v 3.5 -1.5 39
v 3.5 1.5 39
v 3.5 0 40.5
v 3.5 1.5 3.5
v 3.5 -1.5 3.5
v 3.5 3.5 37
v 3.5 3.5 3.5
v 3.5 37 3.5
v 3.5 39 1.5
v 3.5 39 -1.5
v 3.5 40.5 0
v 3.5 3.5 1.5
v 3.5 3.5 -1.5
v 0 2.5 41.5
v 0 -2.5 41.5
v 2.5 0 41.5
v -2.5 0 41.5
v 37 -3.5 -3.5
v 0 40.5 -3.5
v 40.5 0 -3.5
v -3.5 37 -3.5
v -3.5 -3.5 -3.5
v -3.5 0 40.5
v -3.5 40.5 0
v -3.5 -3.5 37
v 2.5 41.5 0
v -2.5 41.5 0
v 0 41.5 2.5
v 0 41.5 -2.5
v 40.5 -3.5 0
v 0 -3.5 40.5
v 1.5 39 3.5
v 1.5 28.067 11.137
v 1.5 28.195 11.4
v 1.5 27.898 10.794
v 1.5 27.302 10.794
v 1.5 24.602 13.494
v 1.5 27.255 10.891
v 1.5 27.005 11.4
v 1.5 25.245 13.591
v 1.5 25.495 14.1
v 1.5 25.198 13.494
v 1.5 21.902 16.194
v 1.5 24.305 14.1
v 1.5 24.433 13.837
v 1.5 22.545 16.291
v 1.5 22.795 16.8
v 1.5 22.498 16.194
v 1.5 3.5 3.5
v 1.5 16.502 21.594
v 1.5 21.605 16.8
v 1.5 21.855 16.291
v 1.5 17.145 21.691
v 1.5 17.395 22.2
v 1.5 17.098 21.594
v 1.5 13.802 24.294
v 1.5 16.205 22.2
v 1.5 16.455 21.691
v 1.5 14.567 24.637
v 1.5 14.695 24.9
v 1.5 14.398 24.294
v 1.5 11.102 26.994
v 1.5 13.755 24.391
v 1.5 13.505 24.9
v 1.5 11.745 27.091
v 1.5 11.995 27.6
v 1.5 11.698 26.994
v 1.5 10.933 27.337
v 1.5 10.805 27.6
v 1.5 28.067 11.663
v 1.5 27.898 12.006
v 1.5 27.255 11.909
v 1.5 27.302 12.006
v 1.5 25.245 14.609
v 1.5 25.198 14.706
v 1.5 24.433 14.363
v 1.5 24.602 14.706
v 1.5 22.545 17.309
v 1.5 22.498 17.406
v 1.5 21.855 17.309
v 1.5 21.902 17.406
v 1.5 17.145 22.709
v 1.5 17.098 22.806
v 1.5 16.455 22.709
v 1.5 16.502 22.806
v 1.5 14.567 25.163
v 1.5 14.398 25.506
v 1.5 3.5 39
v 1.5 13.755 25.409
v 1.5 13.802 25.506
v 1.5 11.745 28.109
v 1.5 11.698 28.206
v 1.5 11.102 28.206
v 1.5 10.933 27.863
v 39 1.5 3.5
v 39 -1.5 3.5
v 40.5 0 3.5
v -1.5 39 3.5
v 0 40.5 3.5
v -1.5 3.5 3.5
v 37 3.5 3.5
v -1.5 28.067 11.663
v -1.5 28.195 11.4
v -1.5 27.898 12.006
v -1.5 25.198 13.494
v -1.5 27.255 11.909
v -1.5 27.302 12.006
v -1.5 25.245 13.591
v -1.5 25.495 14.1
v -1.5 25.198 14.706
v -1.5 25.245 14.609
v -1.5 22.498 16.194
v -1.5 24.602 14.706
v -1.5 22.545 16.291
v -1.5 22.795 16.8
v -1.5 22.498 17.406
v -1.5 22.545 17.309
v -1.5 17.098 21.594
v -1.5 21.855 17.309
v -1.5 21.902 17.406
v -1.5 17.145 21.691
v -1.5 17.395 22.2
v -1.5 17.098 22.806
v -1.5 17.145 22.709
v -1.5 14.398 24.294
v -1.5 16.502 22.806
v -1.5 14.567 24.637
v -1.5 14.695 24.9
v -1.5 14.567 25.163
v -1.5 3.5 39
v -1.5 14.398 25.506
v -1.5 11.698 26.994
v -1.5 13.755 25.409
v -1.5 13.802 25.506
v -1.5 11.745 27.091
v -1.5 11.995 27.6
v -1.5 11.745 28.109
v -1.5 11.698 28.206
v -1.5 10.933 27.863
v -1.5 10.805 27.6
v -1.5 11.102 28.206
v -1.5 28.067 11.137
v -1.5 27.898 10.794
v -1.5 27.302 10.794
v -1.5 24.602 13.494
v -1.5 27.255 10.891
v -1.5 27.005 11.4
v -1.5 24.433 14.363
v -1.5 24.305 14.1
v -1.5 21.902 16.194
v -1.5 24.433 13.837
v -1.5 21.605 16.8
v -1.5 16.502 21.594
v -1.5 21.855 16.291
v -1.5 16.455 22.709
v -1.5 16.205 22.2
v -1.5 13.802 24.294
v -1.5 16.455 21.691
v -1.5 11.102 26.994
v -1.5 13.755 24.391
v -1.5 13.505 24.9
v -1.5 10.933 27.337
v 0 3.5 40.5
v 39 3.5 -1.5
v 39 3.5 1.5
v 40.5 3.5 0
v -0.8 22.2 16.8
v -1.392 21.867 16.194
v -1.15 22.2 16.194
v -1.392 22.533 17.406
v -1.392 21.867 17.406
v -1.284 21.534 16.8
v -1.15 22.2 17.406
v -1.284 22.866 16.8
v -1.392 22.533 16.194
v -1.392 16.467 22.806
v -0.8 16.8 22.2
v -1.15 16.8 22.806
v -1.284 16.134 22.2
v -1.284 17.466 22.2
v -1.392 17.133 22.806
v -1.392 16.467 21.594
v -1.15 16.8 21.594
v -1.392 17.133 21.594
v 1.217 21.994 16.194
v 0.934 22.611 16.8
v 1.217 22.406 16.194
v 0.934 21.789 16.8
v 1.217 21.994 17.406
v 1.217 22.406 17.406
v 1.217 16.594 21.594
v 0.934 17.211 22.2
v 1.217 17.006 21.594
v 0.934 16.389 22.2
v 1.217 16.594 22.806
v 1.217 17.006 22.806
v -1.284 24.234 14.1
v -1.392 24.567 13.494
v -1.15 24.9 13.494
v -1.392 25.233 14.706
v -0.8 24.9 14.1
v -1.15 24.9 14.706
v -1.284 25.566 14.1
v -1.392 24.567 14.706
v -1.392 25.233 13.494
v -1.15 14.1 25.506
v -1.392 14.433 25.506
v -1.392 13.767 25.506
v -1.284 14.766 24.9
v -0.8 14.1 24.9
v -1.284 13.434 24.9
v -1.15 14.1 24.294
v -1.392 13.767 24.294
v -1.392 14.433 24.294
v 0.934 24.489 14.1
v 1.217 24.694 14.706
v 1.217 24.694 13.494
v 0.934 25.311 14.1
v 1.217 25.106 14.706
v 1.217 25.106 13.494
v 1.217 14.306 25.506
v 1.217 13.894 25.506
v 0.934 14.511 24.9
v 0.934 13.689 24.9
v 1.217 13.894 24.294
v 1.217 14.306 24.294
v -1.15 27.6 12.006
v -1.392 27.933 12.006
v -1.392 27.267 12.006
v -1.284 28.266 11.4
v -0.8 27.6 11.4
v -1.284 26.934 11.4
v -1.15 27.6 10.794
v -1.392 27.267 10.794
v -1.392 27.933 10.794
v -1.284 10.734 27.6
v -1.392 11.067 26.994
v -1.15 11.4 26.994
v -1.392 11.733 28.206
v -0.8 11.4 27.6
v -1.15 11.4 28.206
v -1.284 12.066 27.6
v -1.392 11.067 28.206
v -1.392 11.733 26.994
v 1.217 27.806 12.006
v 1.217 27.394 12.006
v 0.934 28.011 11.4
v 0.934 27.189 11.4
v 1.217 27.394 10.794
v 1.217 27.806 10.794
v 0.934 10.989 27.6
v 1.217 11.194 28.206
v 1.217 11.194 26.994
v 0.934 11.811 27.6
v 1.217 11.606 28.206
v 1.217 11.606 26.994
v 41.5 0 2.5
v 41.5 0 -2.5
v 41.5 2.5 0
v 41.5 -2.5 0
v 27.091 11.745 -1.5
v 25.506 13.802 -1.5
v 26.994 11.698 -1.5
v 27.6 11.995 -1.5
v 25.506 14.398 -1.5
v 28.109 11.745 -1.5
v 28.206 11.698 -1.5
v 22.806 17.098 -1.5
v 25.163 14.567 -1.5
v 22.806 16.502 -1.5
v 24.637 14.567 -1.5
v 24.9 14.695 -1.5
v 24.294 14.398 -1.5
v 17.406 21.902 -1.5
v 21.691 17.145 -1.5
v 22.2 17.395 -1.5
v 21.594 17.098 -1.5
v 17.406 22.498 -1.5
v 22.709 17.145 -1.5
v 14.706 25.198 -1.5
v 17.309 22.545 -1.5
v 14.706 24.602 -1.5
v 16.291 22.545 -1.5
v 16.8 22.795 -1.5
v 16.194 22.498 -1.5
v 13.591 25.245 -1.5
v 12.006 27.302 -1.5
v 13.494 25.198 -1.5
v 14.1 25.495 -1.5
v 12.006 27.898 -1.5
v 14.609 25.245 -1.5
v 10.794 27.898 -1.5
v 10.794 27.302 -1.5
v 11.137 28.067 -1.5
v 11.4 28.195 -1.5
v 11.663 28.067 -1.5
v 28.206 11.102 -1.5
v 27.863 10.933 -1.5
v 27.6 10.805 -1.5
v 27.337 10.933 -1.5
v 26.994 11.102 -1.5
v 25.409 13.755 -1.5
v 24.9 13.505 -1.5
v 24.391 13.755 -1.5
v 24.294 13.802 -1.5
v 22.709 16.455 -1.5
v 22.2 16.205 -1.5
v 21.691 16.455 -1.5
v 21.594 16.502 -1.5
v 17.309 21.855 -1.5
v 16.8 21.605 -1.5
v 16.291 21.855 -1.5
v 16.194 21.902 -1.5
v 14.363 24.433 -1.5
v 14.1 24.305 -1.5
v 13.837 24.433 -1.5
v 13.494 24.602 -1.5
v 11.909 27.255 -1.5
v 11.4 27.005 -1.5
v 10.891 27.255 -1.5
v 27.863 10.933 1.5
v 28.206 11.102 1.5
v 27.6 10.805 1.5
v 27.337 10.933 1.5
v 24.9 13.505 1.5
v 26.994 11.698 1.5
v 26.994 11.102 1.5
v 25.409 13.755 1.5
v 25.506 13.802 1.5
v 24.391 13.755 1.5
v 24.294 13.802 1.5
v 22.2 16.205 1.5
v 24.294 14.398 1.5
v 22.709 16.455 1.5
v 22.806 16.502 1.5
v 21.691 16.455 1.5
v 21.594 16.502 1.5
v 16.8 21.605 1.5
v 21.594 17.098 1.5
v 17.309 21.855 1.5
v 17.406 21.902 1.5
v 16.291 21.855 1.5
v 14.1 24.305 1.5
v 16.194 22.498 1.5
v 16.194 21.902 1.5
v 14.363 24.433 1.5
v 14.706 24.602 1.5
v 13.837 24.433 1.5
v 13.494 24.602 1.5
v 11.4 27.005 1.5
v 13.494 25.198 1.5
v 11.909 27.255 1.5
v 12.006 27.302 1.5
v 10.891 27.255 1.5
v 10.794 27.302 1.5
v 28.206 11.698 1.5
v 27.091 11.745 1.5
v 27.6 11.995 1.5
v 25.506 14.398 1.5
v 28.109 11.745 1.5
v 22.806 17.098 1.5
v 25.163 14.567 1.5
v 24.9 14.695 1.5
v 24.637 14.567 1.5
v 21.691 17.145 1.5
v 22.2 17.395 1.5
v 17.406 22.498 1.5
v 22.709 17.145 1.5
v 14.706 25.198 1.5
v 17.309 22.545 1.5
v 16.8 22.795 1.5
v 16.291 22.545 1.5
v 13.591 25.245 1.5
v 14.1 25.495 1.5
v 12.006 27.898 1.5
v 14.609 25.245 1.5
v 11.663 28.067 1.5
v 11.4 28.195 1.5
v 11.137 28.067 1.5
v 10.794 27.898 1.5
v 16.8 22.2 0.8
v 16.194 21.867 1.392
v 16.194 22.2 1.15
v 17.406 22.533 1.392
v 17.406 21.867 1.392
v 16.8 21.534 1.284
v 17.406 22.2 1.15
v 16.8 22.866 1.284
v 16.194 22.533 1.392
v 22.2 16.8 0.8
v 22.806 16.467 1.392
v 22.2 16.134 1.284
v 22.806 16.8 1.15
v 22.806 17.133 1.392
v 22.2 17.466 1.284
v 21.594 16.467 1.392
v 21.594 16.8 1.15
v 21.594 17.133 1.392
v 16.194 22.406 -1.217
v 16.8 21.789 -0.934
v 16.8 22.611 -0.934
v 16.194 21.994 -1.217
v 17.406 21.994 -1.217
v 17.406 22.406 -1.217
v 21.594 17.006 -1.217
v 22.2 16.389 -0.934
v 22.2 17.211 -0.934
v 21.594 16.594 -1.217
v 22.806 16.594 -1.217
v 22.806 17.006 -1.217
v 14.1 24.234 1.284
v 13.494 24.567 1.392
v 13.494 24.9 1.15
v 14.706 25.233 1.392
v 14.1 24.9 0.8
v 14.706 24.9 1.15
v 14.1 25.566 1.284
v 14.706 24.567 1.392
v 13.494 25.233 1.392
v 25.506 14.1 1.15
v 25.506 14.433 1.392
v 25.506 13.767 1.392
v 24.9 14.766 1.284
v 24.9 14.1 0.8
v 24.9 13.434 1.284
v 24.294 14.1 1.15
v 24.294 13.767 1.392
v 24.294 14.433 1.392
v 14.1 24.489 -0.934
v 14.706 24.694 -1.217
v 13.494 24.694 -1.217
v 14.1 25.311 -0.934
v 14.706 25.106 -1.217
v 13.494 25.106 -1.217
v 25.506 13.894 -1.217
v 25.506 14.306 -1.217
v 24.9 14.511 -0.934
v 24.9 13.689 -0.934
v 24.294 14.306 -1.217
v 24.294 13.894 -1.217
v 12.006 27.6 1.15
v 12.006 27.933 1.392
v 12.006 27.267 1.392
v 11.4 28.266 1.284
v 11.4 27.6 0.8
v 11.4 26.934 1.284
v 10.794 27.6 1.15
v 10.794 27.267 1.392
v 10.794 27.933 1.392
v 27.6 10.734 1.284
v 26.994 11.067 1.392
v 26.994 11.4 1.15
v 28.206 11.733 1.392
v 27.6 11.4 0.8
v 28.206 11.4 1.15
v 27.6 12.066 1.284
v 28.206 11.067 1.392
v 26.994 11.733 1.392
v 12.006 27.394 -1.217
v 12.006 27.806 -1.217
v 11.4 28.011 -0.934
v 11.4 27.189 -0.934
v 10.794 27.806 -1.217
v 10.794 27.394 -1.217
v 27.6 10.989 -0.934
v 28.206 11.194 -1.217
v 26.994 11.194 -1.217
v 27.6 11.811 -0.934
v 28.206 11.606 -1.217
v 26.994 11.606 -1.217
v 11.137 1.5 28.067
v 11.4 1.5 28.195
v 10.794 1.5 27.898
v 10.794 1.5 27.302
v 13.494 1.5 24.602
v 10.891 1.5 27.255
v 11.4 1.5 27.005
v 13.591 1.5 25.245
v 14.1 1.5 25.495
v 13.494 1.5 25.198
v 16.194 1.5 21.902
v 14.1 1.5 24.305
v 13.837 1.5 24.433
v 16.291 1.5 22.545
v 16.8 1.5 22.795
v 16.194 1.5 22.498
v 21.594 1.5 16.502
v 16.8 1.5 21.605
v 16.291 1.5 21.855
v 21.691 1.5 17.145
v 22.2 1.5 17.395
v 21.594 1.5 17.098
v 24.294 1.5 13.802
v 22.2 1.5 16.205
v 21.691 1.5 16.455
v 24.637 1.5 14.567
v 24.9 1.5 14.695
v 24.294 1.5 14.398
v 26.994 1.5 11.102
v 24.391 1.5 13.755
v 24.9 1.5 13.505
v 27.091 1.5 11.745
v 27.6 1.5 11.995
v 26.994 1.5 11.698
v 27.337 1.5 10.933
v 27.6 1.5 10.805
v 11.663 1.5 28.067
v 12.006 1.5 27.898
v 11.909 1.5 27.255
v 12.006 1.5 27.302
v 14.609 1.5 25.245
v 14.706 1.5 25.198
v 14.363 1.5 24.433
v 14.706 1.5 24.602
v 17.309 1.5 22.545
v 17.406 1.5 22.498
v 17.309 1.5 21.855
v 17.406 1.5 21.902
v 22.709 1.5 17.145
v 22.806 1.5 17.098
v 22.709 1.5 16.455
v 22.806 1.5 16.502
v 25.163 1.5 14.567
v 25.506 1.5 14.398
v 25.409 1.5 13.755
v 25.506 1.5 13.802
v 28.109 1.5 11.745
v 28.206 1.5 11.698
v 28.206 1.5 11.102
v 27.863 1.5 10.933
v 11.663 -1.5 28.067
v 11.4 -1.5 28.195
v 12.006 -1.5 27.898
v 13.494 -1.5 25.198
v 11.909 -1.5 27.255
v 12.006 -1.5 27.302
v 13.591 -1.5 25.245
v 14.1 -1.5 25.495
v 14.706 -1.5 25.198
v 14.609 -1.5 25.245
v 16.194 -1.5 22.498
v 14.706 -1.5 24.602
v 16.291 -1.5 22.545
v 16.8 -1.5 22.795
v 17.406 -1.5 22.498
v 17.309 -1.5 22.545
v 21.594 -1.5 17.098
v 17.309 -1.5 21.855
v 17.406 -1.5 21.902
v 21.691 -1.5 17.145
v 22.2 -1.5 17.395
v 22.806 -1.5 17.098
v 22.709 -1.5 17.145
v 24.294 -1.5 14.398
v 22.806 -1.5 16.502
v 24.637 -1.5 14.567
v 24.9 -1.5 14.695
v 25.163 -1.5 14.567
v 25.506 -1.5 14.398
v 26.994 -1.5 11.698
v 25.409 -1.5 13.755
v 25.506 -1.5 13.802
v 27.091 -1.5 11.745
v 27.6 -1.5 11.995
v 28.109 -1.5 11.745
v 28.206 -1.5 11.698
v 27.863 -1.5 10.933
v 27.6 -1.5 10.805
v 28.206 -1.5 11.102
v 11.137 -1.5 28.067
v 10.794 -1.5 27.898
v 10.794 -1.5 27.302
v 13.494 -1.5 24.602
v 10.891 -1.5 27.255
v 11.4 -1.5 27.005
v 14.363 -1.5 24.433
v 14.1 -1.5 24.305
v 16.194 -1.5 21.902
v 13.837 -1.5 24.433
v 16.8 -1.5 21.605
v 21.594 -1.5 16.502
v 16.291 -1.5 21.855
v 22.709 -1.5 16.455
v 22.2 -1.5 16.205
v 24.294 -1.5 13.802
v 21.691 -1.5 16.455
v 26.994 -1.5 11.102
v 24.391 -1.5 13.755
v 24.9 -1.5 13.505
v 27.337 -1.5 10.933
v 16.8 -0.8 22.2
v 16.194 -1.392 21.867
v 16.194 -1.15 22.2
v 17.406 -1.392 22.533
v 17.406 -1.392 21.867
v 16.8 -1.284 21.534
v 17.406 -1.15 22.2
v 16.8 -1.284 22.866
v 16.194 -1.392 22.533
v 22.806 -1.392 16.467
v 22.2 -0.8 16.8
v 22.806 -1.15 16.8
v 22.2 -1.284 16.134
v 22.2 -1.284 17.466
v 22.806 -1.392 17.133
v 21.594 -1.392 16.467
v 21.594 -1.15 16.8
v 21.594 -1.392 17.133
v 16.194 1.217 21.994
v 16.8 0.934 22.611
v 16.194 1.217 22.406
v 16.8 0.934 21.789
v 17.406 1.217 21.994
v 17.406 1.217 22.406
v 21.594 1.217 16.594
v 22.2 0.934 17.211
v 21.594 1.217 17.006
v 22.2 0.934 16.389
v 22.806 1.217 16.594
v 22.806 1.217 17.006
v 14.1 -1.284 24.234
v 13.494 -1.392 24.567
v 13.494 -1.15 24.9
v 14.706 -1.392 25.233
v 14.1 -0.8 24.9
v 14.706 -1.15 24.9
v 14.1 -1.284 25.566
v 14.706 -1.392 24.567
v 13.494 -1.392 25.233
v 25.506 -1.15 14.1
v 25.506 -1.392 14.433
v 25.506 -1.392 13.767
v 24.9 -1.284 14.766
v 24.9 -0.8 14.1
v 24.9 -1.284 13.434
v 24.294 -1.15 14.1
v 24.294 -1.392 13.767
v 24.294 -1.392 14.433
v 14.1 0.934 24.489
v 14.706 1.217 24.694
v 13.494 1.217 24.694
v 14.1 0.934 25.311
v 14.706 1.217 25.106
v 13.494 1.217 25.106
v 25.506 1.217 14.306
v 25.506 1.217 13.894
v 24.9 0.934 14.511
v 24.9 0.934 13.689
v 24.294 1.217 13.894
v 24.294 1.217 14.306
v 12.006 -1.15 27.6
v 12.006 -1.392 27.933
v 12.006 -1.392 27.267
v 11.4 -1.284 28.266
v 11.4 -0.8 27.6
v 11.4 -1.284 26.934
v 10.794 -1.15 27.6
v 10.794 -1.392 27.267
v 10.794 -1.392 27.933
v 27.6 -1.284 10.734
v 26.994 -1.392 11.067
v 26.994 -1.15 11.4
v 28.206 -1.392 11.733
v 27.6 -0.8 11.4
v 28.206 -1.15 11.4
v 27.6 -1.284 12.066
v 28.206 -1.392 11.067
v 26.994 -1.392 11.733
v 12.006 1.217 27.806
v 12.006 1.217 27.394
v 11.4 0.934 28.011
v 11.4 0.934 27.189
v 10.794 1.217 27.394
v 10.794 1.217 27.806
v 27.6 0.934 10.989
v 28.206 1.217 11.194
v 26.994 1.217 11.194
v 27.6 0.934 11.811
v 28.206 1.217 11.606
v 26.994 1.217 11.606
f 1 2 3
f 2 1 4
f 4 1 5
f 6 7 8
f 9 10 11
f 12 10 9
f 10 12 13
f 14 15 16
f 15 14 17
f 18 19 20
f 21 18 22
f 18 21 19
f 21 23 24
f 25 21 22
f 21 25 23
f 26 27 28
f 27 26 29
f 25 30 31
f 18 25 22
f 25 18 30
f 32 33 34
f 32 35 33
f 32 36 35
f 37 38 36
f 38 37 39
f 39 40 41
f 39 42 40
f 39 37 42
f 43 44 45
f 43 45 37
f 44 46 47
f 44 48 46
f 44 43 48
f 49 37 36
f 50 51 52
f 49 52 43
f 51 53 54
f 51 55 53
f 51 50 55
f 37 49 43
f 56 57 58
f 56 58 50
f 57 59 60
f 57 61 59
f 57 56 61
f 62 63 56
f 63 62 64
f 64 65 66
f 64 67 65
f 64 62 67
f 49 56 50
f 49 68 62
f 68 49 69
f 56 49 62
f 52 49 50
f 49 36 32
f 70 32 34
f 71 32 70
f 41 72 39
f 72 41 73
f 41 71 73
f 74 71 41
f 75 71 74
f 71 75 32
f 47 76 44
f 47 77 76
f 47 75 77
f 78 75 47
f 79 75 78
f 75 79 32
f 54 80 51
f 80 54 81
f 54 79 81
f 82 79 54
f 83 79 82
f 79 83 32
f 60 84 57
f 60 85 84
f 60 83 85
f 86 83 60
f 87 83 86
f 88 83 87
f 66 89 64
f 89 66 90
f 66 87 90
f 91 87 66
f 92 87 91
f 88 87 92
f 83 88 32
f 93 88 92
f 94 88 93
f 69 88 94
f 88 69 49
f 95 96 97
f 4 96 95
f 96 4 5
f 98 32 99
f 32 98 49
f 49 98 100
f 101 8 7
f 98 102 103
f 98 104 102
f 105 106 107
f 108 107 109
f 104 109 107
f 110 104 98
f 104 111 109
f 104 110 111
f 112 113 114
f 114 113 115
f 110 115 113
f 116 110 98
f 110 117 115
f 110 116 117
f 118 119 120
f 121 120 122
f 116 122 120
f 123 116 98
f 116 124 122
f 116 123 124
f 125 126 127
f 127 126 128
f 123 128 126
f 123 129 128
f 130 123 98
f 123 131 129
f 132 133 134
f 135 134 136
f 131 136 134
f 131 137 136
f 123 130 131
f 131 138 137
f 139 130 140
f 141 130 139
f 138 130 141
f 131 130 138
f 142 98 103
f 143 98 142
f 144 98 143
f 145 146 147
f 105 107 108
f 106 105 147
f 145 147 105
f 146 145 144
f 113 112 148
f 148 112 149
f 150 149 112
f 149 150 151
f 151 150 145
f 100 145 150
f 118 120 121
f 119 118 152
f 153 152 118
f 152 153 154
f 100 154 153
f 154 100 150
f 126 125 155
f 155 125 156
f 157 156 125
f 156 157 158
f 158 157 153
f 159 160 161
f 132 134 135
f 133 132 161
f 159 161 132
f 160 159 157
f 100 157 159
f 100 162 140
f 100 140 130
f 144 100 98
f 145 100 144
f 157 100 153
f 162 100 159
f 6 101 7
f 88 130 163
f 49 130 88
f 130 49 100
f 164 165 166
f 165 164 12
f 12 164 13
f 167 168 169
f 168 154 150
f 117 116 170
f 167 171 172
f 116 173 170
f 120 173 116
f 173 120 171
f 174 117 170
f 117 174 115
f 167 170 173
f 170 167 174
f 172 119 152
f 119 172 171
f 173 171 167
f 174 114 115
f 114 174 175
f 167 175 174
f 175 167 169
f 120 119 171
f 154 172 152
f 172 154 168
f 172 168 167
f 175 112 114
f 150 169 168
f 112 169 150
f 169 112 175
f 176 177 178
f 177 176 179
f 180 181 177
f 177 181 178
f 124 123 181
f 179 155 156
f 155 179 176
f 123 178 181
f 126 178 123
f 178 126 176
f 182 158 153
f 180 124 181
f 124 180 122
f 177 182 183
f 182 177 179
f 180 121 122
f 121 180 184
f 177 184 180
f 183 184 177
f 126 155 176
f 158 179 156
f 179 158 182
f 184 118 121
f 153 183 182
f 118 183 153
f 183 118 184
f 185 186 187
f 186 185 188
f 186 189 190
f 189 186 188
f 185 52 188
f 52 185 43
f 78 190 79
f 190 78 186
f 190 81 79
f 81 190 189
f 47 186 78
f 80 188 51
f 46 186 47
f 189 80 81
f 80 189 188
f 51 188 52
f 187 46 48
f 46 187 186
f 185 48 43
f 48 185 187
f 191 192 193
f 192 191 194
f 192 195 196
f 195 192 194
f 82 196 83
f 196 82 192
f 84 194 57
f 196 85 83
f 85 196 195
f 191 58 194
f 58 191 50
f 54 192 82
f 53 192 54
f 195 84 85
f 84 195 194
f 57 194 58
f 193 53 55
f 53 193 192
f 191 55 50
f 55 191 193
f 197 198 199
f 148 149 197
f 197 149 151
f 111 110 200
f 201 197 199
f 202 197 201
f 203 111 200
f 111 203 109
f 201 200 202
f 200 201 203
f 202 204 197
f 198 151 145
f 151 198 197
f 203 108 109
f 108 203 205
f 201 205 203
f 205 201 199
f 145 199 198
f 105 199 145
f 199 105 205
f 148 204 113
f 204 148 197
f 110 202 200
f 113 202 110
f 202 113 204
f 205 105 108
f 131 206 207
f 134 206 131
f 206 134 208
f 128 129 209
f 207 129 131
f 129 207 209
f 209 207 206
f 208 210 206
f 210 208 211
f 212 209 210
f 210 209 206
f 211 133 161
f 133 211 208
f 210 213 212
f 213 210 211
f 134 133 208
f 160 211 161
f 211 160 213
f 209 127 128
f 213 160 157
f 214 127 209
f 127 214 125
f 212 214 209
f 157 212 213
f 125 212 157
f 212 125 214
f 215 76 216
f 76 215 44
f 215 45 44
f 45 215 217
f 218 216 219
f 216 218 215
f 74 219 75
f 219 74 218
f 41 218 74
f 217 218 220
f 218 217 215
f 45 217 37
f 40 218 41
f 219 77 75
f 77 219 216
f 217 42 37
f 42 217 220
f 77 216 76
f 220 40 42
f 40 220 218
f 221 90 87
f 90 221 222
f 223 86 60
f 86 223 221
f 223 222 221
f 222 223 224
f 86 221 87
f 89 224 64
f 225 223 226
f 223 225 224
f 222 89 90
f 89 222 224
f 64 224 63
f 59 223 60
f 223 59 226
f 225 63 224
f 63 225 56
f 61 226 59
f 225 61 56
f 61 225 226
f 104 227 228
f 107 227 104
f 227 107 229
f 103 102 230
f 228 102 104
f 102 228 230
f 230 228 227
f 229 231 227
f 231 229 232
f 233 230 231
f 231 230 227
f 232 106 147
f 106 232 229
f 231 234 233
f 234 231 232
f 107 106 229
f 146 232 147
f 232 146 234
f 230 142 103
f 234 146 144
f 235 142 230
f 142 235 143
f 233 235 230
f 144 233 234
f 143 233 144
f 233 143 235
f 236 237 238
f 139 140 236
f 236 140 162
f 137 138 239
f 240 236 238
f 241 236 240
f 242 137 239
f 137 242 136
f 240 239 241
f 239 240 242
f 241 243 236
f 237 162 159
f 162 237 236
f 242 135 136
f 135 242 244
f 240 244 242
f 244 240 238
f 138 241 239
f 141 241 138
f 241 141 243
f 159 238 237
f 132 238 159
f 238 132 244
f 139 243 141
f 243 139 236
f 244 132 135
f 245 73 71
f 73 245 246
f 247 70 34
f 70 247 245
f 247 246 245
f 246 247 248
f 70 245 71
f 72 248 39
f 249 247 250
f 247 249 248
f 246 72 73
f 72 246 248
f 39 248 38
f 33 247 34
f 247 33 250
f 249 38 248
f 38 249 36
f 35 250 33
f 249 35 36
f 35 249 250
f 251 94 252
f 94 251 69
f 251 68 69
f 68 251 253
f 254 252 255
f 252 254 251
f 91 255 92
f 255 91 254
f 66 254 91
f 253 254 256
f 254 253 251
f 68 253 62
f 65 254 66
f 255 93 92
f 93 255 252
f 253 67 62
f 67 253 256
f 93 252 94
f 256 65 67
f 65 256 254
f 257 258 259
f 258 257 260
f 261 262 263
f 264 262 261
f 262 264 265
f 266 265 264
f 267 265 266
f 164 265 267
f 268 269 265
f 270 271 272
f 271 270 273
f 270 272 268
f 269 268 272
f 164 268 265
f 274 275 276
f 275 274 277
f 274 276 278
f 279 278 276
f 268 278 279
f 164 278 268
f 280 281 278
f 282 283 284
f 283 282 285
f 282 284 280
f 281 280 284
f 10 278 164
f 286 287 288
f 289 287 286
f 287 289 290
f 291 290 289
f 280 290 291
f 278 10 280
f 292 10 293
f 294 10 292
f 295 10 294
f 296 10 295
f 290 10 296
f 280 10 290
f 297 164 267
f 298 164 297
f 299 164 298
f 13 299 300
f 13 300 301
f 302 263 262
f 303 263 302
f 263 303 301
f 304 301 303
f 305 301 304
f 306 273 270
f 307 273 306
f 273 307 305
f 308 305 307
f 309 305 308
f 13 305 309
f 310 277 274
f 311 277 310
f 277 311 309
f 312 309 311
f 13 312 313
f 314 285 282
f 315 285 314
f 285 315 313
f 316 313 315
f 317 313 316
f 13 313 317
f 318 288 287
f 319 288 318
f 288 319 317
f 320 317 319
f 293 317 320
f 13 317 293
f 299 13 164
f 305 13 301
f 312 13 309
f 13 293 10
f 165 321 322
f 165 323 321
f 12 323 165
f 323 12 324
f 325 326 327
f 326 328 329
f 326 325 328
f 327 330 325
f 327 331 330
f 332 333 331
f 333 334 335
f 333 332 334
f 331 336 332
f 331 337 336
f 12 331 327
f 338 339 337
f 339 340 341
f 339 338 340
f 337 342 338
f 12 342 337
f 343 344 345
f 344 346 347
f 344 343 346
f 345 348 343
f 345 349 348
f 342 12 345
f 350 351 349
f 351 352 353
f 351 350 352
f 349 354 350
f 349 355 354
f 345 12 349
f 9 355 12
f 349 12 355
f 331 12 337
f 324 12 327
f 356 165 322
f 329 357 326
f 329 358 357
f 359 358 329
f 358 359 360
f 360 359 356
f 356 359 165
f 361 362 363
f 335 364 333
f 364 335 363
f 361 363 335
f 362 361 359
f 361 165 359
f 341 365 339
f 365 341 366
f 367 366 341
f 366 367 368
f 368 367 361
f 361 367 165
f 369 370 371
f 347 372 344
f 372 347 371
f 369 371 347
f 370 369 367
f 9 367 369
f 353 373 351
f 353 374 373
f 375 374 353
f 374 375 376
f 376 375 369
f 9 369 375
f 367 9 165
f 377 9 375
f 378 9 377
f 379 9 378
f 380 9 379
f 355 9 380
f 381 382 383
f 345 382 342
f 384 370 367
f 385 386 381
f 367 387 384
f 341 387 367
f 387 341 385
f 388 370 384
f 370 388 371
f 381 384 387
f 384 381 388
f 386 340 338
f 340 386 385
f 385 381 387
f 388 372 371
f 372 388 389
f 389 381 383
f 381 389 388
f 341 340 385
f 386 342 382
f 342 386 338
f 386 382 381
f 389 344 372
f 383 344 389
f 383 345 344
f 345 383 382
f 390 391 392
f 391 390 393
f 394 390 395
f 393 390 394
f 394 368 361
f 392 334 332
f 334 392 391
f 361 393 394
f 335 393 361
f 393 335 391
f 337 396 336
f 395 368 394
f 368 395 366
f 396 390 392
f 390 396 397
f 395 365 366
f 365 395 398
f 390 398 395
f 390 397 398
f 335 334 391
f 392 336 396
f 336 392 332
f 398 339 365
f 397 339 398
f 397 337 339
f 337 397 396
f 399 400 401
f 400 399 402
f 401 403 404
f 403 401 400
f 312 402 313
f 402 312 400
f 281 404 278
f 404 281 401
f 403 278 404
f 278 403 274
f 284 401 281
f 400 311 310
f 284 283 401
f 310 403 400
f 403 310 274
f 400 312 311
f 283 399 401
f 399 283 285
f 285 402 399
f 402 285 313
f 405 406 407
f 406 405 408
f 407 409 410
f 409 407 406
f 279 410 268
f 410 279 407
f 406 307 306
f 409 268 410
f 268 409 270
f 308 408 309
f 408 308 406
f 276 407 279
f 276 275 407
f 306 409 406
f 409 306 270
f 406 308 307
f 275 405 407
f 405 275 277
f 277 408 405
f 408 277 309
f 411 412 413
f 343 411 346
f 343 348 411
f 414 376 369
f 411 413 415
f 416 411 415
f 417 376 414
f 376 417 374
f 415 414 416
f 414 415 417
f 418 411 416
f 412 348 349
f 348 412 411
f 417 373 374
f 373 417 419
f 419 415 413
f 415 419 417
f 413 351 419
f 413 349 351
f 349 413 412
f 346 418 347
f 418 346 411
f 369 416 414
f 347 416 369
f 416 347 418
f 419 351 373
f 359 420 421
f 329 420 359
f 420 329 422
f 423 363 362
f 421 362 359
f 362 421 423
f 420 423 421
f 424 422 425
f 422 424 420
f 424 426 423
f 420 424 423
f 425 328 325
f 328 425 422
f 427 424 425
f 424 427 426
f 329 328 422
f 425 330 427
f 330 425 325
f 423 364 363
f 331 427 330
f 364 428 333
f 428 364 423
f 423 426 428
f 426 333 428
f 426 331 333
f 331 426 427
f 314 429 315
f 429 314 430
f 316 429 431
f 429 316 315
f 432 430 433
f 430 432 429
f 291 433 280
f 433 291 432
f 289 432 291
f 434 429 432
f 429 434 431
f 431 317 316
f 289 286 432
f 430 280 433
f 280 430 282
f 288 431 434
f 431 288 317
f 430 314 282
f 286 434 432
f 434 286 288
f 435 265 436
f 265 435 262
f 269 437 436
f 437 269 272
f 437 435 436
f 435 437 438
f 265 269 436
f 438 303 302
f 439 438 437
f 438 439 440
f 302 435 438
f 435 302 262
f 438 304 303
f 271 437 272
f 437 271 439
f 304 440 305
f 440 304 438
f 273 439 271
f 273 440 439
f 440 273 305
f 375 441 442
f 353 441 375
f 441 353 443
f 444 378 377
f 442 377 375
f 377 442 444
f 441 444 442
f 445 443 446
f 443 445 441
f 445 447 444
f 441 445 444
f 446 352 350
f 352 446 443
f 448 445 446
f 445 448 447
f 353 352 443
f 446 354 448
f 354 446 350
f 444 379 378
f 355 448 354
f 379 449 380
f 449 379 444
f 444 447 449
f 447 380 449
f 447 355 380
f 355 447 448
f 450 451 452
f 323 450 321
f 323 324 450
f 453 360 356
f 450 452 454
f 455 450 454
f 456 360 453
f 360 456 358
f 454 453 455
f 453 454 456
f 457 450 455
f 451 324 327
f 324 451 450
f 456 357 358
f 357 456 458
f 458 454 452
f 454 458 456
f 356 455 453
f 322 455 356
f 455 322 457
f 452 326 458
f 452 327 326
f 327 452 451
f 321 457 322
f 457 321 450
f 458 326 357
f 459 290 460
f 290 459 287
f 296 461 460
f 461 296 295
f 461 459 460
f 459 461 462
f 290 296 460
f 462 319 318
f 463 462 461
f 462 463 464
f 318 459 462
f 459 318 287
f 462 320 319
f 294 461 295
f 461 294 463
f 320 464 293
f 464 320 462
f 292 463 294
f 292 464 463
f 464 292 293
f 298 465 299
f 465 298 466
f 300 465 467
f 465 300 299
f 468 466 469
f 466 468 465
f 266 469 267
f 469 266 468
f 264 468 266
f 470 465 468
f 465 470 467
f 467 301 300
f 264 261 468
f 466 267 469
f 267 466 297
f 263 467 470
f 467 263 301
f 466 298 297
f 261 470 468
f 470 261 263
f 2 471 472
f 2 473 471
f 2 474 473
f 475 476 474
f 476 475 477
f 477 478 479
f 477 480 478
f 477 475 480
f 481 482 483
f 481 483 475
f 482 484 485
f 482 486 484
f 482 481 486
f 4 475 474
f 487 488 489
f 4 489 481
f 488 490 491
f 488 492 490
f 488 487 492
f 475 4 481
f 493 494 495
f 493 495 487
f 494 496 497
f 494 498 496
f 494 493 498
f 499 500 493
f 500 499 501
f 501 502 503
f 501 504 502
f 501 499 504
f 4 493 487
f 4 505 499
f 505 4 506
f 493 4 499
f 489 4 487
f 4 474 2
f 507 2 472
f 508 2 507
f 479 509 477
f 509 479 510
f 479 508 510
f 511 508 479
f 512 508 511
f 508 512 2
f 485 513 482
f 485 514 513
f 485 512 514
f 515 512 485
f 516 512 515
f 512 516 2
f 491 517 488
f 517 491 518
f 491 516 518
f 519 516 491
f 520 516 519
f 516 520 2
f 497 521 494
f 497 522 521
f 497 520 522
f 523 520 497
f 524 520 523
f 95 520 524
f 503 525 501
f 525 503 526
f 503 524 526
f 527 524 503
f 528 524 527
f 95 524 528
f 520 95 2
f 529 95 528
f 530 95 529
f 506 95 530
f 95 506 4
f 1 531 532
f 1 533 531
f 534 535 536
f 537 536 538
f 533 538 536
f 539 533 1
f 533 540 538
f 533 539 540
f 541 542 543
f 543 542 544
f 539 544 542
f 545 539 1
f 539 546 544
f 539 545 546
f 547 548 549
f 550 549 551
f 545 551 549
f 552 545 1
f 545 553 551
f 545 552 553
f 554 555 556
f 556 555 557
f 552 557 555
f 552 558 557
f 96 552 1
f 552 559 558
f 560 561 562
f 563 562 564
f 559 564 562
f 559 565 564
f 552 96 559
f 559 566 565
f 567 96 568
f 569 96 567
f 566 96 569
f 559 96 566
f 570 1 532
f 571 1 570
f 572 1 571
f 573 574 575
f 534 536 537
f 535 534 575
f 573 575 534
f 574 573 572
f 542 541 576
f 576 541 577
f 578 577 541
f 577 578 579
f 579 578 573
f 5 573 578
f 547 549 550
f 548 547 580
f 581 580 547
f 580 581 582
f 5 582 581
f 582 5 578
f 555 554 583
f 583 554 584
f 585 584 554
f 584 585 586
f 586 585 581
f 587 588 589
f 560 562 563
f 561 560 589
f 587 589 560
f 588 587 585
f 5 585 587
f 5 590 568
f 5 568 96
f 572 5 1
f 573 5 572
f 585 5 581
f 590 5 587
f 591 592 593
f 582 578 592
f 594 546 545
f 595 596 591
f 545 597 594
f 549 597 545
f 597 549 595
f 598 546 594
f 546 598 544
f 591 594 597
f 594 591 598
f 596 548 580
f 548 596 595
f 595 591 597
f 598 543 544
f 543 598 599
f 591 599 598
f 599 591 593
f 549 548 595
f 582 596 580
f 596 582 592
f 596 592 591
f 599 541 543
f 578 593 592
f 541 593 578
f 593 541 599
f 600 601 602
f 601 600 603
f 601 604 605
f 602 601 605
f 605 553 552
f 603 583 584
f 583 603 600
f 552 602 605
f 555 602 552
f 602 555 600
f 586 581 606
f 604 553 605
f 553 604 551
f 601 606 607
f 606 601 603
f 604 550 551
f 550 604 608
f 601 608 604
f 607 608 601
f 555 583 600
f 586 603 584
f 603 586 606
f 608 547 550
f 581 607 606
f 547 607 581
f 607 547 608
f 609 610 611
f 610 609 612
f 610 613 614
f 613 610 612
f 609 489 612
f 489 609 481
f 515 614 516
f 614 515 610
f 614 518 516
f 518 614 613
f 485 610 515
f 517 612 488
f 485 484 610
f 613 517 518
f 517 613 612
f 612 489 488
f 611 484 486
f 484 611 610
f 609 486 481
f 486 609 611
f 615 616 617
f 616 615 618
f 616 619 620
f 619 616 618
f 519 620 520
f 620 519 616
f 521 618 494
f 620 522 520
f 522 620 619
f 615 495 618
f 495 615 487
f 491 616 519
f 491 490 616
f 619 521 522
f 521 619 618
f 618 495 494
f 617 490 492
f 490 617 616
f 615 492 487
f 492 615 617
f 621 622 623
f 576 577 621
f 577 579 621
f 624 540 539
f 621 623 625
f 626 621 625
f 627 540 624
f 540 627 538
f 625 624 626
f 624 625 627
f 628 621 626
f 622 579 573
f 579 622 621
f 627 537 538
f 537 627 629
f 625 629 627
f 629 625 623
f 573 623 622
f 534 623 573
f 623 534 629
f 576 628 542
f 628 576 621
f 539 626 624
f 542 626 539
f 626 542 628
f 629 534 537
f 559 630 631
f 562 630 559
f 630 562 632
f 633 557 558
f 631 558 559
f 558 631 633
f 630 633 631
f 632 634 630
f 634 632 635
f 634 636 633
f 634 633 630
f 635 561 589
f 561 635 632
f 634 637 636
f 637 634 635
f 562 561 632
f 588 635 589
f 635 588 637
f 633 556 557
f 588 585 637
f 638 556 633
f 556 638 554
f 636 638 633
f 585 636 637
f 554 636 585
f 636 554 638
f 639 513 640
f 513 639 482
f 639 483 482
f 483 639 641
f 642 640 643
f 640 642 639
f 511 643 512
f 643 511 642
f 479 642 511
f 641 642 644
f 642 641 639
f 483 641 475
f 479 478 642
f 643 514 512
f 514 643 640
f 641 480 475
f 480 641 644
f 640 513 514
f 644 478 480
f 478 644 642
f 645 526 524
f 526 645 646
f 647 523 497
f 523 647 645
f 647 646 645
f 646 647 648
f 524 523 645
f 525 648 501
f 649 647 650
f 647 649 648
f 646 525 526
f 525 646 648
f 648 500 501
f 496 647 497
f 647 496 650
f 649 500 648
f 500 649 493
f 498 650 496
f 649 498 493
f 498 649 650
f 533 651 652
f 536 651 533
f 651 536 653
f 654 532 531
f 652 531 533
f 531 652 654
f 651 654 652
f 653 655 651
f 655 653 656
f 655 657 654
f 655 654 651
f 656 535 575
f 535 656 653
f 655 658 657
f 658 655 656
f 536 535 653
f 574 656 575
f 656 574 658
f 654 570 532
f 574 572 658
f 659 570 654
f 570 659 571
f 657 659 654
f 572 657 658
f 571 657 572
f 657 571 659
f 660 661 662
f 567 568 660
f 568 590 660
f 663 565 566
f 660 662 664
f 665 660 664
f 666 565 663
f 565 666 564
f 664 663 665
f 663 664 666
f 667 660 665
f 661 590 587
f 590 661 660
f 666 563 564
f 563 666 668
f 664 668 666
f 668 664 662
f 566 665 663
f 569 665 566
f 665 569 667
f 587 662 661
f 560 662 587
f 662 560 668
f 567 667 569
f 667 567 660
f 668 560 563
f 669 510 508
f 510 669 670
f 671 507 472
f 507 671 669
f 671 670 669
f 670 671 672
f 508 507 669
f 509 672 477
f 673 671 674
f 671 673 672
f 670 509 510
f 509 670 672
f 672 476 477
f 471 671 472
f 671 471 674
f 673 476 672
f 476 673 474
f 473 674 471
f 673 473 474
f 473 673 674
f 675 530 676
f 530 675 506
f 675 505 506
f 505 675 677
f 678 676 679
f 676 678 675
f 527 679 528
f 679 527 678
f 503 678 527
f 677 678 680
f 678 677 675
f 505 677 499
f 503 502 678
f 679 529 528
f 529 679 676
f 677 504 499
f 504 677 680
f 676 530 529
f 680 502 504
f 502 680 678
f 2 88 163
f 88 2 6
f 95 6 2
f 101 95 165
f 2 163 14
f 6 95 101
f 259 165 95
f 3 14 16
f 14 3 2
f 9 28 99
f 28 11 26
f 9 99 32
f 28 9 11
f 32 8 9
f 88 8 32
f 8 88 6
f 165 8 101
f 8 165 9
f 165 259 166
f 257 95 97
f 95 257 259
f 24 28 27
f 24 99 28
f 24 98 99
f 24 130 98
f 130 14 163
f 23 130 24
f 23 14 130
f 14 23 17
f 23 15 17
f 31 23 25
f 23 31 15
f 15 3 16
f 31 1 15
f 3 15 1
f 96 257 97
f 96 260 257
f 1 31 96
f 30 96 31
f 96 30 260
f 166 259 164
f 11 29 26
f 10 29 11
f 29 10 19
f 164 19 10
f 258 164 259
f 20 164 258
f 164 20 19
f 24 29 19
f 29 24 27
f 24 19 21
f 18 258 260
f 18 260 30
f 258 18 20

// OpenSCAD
intersection(){
    octahedron(30+14);
    translate([0,1.5,0]) connector(3, 2, 40, 0.7, 2, 3, 2, true);
}

//arm(3, 3, 30, 0.7, 2, 3, 2, true);

module connector(board_t, wall_t, arm_w, teeth_r, teeth_o, teeth_n, side_n, back) {
        
        for(r = [0:side_n-1]){
            rotate ([0, r*90, 0])
                translate([-(board_t/2+wall_t),0,board_t/2])
                arm(board_t, wall_t, arm_w, teeth_r, teeth_o, teeth_n);
        }
        
        
        if(back && side_n > 1) {
            for(r = [1:side_n-1])
                rotate ([90*r, 0, 90])
                    translate([-(board_t+wall_t),board_t/2,board_t/2])
                    arm(board_t, wall_t, arm_w, teeth_r, teeth_o, teeth_n);
            
            if(side_n == 4) {
                 rotate ([90*4, 0, 90])
                    translate([-(board_t+wall_t),board_t/2,board_t/2])
                    arm(board_t, wall_t, arm_w, teeth_r, teeth_o, teeth_n);               
            }
        }
        
}




module arm(board_t, wall_t, arm_w, teeth_r, teeth_o, teeth_n) {
    difference(){
        translate([0,-wall_t-board_t,-wall_t-board_t]) cube([board_t+wall_t*2,arm_w+board_t+wall_t,arm_w+board_t+wall_t]);
        translate([wall_t,wall_t,wall_t]) cube([board_t,arm_w-wall_t,arm_w-wall_t]);
    }
    for(t = [1:teeth_n]){
        #translate([wall_t, arm_w/2-teeth_o+(teeth_o+teeth_r)*t ,arm_w/2-teeth_o-(teeth_o+teeth_r)*t ]) sphere(teeth_r);
        #translate([wall_t, arm_w/2-teeth_o-(teeth_o+teeth_r)*t ,arm_w/2-teeth_o+(teeth_o+teeth_r)*t ]) sphere(teeth_r);
        #translate([wall_t+board_t, arm_w/2-teeth_o+(teeth_o+teeth_r)*t ,arm_w/2-teeth_o-(teeth_o+teeth_r)*t ]) sphere(teeth_r);
        #translate([wall_t+board_t, arm_w/2-teeth_o-(teeth_o+teeth_r)*t ,arm_w/2-teeth_o+(teeth_o+teeth_r)*t ]) sphere(teeth_r);
    }
}
module octahedron (w) {
    polyhedron(
  points=[ [w,0,0],[0,w,0],[-w,0,0],[0,-w,0],
           [0,0,w], [0,0,-w] ],   
  faces=[ [0,1,4],[1,2,4],[2,3,4],[3,0,4], 
            [0,5,1],[1,5,2],[2,5,3],[3,5,0]]      
 );
}
